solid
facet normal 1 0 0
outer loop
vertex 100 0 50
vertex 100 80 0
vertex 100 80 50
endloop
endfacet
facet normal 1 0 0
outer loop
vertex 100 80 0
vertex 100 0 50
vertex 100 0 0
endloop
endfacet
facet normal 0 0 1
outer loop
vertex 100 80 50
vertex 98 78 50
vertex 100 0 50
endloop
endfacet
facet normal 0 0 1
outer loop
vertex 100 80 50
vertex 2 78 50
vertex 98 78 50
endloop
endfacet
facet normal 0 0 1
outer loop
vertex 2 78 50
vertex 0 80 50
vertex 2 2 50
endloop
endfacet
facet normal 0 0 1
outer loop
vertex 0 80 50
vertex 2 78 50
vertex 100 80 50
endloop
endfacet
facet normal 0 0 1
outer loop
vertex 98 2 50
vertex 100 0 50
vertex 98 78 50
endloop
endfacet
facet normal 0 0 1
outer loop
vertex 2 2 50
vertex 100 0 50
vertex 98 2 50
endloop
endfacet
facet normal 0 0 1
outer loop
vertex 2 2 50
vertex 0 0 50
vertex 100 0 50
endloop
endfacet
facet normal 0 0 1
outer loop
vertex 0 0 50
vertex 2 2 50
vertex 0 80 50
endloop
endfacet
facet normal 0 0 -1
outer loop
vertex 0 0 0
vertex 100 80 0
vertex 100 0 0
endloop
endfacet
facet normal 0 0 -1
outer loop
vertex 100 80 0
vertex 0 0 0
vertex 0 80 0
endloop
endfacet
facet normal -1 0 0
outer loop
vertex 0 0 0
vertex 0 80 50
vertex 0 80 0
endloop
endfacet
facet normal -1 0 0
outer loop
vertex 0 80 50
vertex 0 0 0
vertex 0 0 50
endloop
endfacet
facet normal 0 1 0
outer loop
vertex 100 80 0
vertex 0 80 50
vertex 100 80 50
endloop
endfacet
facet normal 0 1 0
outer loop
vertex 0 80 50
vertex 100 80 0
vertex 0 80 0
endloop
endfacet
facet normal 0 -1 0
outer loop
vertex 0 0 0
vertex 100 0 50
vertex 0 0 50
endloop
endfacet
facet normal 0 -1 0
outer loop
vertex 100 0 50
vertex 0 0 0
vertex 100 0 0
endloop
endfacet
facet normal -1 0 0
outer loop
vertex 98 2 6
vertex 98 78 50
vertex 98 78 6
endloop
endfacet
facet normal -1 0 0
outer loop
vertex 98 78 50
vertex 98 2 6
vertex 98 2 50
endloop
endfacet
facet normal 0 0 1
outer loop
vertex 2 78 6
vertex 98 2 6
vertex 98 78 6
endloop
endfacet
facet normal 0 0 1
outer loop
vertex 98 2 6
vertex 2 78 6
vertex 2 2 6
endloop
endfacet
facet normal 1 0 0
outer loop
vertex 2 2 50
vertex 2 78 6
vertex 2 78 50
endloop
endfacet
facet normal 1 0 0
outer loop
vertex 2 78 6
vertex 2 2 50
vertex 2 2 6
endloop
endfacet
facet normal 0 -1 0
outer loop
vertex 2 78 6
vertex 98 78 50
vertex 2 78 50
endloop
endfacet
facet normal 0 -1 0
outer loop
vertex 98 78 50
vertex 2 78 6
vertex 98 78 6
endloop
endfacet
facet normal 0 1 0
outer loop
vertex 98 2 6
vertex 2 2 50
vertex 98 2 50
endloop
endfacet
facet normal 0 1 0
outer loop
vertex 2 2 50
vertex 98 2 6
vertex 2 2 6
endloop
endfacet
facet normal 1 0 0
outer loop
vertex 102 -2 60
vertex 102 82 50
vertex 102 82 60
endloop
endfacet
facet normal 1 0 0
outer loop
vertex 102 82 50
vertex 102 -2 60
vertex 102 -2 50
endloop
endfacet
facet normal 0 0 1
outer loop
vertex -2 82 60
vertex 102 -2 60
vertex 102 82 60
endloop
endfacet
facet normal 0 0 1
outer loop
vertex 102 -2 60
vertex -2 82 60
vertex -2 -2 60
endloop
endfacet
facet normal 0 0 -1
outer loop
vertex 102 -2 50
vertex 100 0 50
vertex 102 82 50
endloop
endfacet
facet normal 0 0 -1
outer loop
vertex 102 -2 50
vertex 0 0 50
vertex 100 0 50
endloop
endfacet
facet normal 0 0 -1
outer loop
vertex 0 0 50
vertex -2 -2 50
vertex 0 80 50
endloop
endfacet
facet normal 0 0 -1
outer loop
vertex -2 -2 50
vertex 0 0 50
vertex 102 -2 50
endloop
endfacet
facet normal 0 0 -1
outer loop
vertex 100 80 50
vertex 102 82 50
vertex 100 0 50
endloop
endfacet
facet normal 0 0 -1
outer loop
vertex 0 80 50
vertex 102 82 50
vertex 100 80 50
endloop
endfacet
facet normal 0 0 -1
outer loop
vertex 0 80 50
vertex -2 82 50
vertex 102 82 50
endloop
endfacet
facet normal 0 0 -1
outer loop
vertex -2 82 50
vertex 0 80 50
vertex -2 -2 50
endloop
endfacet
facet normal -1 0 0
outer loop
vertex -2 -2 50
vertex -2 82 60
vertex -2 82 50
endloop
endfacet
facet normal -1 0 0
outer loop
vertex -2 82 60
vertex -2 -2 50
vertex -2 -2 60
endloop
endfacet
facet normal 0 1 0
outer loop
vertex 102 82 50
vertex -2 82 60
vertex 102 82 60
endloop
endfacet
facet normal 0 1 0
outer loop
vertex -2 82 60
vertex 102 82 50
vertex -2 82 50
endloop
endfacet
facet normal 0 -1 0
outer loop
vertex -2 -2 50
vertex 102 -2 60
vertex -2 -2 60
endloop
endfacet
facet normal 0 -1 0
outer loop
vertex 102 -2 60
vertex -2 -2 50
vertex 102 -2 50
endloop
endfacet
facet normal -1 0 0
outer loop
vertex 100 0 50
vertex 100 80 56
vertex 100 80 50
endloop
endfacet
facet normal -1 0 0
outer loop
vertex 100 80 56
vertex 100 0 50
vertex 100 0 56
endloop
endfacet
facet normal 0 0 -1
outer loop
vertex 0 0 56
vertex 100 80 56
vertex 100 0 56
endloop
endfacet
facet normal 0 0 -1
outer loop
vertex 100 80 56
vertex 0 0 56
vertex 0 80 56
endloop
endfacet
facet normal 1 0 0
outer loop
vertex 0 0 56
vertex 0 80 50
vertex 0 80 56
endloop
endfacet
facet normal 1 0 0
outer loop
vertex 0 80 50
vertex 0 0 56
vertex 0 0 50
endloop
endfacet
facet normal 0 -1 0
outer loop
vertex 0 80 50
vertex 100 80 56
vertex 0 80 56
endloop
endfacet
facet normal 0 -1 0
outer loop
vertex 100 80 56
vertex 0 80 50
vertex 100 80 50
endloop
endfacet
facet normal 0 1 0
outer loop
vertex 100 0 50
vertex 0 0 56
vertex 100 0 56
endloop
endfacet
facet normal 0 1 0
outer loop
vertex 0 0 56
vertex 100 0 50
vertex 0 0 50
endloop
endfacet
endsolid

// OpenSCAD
x = 100;
y = 80;
z = 50;
hr = 2;

difference(){
    cube([x, y, z], false);
    translate([hr, hr, 3*hr]){
        cube([x-hr*2, y-hr*2, z-hr*2], false);
    };
};

difference(){
    translate([-hr, -hr, z]){
        cube([x+hr*2, y+hr*2, 10], false);
    };
    translate([0, 0, z-hr]){
        cube([x, y, 8], false);
    };
   
};
